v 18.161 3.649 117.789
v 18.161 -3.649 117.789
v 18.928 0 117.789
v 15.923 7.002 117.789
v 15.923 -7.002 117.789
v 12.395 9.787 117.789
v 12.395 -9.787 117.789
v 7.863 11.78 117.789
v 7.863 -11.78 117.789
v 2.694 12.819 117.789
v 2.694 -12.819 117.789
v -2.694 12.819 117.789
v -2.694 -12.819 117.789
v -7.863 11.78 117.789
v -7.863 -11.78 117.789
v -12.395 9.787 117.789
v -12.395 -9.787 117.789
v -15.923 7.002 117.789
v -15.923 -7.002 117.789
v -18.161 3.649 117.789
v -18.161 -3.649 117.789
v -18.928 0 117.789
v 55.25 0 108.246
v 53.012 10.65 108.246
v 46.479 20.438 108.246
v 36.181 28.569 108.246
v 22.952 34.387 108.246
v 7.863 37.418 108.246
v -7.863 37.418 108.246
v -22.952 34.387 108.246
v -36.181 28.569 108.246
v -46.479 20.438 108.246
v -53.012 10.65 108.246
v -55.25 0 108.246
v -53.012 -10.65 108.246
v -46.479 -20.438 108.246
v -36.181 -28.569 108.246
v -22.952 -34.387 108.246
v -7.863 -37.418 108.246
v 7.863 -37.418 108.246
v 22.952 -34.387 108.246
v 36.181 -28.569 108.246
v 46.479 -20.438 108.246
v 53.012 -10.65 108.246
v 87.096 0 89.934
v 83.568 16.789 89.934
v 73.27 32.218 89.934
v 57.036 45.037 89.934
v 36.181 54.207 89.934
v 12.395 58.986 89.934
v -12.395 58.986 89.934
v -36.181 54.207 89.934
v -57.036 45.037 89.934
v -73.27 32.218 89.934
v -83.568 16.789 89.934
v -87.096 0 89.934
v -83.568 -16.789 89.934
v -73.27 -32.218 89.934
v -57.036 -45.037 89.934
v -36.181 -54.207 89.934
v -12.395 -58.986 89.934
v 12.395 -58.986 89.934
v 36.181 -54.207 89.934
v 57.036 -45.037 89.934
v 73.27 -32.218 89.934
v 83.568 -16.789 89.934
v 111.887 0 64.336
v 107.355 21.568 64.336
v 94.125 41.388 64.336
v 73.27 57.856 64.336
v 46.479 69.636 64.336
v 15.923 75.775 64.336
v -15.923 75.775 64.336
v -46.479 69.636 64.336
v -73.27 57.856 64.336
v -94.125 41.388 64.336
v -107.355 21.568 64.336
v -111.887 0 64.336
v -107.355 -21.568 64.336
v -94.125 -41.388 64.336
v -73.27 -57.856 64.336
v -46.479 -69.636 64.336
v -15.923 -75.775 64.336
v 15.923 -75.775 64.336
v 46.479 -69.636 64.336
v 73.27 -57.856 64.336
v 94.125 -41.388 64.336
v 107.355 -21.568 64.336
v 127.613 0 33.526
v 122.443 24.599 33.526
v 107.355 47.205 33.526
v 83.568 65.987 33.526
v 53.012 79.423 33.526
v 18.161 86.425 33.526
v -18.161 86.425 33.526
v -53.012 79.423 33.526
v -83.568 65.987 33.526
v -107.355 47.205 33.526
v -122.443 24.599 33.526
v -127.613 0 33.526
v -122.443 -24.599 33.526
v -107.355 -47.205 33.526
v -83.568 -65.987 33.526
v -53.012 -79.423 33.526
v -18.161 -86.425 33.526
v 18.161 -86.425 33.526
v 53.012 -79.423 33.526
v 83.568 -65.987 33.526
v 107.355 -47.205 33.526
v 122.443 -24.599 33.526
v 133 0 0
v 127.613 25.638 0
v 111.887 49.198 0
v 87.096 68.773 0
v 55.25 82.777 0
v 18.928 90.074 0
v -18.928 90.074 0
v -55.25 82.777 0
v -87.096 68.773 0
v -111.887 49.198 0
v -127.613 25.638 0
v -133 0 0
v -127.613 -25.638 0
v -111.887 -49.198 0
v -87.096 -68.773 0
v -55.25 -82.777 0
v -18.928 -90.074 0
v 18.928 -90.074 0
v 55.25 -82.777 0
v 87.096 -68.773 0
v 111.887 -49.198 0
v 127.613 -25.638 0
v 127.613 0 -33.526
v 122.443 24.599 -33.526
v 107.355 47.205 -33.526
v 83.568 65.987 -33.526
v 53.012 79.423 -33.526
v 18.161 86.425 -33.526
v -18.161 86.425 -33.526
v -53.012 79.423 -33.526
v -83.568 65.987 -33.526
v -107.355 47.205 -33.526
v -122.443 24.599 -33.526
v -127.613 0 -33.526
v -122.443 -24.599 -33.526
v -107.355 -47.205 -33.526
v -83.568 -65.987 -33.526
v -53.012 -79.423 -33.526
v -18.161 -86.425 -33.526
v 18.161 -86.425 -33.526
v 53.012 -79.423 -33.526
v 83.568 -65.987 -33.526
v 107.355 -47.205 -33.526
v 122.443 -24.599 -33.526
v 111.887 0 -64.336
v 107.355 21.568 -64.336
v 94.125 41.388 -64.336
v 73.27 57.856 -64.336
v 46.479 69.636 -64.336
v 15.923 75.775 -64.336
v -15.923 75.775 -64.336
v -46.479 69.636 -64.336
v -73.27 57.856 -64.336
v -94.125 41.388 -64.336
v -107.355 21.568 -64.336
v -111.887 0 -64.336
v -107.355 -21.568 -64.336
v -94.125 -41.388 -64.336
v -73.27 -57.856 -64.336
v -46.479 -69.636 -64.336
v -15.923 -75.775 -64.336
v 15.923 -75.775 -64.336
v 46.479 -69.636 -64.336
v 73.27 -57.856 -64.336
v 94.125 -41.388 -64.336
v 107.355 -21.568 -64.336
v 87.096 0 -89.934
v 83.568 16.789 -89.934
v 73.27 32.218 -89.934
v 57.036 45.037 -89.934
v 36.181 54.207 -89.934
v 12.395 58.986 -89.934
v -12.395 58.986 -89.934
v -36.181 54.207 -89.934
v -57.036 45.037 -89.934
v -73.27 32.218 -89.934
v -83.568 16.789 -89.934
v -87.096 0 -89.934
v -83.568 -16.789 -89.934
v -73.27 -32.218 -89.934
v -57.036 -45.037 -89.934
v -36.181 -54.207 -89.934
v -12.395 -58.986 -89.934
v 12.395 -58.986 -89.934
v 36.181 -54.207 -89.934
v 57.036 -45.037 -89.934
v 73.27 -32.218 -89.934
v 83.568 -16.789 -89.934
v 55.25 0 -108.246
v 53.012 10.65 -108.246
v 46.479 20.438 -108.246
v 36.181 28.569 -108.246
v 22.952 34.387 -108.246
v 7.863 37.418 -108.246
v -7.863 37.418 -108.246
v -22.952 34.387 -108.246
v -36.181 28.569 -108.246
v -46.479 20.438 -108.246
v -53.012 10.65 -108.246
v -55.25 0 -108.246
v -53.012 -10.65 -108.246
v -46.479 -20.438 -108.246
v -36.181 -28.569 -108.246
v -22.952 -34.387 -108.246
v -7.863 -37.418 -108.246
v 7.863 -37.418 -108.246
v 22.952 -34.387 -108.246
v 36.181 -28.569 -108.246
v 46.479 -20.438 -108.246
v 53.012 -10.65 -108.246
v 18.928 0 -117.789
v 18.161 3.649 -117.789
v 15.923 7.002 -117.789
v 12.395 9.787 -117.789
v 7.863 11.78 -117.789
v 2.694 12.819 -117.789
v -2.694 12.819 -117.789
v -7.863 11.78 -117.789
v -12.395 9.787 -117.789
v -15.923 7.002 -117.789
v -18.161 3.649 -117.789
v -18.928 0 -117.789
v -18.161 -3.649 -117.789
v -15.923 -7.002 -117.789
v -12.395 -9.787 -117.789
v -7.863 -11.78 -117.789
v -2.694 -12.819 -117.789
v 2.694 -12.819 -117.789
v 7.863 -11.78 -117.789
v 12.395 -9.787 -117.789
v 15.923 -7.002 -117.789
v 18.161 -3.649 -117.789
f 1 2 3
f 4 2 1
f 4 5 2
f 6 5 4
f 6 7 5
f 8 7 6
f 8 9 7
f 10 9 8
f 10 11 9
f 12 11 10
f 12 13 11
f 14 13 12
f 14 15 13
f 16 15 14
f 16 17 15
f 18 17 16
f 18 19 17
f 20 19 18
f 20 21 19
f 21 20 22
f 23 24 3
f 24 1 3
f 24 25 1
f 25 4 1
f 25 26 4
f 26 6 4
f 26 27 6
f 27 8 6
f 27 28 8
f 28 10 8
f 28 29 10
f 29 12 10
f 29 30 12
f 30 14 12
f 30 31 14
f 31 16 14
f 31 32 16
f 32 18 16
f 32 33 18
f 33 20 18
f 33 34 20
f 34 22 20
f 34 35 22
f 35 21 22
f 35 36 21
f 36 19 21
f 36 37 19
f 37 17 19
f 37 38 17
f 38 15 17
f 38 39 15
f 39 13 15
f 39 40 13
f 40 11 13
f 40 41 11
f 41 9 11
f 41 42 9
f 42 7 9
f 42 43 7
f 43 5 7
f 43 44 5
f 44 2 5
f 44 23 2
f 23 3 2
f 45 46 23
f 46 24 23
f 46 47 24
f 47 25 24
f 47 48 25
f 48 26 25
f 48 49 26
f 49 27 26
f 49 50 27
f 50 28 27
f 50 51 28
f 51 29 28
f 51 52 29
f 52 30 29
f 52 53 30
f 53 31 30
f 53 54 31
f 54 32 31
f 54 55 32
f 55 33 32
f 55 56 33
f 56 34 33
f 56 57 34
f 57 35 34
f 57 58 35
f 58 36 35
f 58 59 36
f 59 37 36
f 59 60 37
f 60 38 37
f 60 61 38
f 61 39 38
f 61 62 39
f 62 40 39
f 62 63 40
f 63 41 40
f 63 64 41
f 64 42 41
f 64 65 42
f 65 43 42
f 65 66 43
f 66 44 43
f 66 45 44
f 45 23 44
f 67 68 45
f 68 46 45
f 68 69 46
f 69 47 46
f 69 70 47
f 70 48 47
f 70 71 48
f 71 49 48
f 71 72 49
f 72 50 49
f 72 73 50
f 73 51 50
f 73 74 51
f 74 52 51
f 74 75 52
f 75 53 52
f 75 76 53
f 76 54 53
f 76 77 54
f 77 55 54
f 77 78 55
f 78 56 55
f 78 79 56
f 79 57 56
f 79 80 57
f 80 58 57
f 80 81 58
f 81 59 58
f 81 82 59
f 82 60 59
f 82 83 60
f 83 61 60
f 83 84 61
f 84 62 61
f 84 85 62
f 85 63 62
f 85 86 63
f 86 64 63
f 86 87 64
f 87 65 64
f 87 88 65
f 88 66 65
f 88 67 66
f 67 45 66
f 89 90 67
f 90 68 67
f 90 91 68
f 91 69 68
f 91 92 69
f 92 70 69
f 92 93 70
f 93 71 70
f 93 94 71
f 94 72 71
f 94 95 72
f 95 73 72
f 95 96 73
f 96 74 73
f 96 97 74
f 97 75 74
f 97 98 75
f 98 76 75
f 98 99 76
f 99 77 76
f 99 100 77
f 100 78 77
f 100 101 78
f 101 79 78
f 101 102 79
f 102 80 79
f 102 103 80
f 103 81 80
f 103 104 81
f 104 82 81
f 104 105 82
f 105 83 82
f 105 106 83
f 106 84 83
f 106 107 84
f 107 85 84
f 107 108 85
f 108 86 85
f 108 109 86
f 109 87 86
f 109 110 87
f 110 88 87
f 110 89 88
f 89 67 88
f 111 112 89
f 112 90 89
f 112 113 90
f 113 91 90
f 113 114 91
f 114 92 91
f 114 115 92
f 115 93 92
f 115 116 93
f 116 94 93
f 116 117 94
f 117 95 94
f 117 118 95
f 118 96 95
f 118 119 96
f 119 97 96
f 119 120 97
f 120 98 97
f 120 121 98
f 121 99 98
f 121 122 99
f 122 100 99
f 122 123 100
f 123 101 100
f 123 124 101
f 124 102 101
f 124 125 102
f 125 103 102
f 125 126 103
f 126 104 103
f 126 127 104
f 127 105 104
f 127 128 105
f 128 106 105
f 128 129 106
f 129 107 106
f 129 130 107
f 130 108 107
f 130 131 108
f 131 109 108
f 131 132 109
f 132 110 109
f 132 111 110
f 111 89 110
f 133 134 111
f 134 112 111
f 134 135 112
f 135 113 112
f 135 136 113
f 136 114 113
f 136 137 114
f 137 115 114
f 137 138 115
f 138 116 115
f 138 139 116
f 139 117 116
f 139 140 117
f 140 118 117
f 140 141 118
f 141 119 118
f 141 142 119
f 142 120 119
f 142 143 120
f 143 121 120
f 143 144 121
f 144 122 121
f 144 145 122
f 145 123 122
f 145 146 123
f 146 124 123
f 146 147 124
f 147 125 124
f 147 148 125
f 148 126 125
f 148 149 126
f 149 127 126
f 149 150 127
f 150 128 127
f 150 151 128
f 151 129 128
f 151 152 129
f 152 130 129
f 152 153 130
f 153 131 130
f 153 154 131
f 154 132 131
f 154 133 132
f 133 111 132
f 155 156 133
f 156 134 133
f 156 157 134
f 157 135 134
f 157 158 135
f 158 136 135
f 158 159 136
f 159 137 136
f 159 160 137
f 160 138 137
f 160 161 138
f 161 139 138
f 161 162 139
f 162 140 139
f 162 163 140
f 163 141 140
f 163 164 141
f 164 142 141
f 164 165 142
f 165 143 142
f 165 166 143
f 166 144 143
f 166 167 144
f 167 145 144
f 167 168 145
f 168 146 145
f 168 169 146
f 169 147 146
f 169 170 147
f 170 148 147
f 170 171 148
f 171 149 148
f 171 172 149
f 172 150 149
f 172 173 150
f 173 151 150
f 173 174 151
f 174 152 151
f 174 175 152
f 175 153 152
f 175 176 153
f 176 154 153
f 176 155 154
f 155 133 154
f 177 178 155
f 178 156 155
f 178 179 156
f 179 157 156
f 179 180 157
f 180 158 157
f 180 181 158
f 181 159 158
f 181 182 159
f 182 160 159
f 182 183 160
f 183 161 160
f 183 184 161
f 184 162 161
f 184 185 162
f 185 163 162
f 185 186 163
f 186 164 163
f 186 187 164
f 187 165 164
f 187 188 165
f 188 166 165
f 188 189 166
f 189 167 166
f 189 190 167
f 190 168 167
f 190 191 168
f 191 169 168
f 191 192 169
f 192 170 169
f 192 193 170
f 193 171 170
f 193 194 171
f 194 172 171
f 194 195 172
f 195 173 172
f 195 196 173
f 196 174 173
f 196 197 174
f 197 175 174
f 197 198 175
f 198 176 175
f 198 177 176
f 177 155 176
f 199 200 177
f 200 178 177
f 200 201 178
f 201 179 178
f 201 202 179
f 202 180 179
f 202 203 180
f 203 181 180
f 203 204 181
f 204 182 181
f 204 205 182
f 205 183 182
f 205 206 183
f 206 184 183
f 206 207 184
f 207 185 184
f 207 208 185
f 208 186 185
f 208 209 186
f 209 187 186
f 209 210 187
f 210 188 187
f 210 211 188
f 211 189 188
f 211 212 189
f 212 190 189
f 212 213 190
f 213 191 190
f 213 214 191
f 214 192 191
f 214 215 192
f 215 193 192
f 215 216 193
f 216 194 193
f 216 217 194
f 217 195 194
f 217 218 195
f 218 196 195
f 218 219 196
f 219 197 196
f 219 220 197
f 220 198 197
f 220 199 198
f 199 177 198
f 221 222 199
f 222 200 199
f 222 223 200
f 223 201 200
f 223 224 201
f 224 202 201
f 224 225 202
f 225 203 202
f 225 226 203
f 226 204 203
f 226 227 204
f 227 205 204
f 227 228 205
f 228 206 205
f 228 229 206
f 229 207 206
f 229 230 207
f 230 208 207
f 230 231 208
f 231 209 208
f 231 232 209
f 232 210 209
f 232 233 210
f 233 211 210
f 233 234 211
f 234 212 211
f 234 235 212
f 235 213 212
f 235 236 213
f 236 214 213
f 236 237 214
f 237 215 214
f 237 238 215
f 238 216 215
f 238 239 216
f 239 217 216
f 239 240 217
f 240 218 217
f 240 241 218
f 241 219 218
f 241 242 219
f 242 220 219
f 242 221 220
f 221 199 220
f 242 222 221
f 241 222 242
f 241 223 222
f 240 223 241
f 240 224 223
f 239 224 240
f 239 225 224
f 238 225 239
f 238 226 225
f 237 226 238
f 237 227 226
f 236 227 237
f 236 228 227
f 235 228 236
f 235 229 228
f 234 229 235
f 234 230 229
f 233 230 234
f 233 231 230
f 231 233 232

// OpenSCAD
// Generated by SolidPython 1.0.1 on 2020-07-29 00:46:54


scale(v = [19, 13, 17]) {
	sphere(r = 7);
}
/***********************************************
*********      SolidPython code:      **********
************************************************
 
# import packages: SolidPython
from solid import *
from solid.utils import *
from itertools import chain, combinations, permutations


class Resize:

    def __init__(self, scad_file):
        self.scad_file = scad_file
        #self.scad_file = import_scad(scad_file)
        # cone/cylinder param:
        self.r1 = 0
        self.r2 = 0
        self.h = 0
        # rectangular prism param:
        self.w = 0
        self.l = 0
        # ellipse param:
        self.r = 0

    # import OpenScad code (file name corresponds to shape)


    # classify shape + parameters
    def assign(self, param1, param2, param3):
        if self.scad_file == 'cone.scad':
            self.r1 = param1
            self.r2 = param2
            self.h = param3
        elif self.scad_file == 'cylinder.scad':
            self.r1 = param1
            self.r2 = param2
            self.h = param3
        elif self.scad_file == 'rectangularPrism.scad':
            self.h = param1
            self.l = param2
            self.w = param3
        else:
            self.r = param1
            self.h = param2

    # resize parameters
    def iterate(self):
        x = range(3, 20, 2)
        i = 1
        if self.scad_file == 'cone.scad':
            tempList = list(permutations(x, 2))
            for temp in tempList:
                param1 = temp[0]
                param2 = temp[1]
                filepath = 'produced_scad_files/' + 'cone' + str(param1) + '_' + str(param2) + '_' + '.scad'
                scad_render_to_file(cylinder(h=param1, r1=param2, r2=0), filepath)

        elif self.scad_file == 'cylinder.scad':
            tempList = list(permutations(x, 3))
            for temp in tempList:
                param1 = temp[0]
                param2 = temp[1]
                filepath = 'produced_scad_files/' + 'cylinder' + str(param1) + '_' + str(param2) + '_' + '.scad'
                scad_render_to_file(cylinder(h=param1, r1=param2, r2=param2), filepath)

        elif self.scad_file == 'rectangularPrism.scad':
            tempList = list(permutations(x, 3))
            for temp in tempList:
                param1 = temp[0]
                param2 = temp[1]
                param3 = temp[2]
                filepath = 'produced_scad_files/' + 'rectangularPrism' + str(param1) + '_' + str(param2) + '_' + str(
                    param3) + '.scad'
                scad_render_to_file(cube(size=(param1, param2, param3)), filepath)

        elif self.scad_file == 'ellipse.scad':
            tempList = list(permutations(x, 4))
            for temp in tempList:
                param1 = temp[0]
                param2 = temp[1]
                param3 = temp[2]
                param4 = temp[3]
                filepath = 'produced_scad_files/' + 'ellipse' + str(param1) + '_' + str(param2) + '_' + str(param3) + '_' + str(param4) + '.scad'
                scad_render_to_file(scale([param1, param2, param3])(sphere(r=param4)), filepath)

    def render_to_scadfile(self):
        scad_render_to_file(scad, 'example.scad') 
 
************************************************/
